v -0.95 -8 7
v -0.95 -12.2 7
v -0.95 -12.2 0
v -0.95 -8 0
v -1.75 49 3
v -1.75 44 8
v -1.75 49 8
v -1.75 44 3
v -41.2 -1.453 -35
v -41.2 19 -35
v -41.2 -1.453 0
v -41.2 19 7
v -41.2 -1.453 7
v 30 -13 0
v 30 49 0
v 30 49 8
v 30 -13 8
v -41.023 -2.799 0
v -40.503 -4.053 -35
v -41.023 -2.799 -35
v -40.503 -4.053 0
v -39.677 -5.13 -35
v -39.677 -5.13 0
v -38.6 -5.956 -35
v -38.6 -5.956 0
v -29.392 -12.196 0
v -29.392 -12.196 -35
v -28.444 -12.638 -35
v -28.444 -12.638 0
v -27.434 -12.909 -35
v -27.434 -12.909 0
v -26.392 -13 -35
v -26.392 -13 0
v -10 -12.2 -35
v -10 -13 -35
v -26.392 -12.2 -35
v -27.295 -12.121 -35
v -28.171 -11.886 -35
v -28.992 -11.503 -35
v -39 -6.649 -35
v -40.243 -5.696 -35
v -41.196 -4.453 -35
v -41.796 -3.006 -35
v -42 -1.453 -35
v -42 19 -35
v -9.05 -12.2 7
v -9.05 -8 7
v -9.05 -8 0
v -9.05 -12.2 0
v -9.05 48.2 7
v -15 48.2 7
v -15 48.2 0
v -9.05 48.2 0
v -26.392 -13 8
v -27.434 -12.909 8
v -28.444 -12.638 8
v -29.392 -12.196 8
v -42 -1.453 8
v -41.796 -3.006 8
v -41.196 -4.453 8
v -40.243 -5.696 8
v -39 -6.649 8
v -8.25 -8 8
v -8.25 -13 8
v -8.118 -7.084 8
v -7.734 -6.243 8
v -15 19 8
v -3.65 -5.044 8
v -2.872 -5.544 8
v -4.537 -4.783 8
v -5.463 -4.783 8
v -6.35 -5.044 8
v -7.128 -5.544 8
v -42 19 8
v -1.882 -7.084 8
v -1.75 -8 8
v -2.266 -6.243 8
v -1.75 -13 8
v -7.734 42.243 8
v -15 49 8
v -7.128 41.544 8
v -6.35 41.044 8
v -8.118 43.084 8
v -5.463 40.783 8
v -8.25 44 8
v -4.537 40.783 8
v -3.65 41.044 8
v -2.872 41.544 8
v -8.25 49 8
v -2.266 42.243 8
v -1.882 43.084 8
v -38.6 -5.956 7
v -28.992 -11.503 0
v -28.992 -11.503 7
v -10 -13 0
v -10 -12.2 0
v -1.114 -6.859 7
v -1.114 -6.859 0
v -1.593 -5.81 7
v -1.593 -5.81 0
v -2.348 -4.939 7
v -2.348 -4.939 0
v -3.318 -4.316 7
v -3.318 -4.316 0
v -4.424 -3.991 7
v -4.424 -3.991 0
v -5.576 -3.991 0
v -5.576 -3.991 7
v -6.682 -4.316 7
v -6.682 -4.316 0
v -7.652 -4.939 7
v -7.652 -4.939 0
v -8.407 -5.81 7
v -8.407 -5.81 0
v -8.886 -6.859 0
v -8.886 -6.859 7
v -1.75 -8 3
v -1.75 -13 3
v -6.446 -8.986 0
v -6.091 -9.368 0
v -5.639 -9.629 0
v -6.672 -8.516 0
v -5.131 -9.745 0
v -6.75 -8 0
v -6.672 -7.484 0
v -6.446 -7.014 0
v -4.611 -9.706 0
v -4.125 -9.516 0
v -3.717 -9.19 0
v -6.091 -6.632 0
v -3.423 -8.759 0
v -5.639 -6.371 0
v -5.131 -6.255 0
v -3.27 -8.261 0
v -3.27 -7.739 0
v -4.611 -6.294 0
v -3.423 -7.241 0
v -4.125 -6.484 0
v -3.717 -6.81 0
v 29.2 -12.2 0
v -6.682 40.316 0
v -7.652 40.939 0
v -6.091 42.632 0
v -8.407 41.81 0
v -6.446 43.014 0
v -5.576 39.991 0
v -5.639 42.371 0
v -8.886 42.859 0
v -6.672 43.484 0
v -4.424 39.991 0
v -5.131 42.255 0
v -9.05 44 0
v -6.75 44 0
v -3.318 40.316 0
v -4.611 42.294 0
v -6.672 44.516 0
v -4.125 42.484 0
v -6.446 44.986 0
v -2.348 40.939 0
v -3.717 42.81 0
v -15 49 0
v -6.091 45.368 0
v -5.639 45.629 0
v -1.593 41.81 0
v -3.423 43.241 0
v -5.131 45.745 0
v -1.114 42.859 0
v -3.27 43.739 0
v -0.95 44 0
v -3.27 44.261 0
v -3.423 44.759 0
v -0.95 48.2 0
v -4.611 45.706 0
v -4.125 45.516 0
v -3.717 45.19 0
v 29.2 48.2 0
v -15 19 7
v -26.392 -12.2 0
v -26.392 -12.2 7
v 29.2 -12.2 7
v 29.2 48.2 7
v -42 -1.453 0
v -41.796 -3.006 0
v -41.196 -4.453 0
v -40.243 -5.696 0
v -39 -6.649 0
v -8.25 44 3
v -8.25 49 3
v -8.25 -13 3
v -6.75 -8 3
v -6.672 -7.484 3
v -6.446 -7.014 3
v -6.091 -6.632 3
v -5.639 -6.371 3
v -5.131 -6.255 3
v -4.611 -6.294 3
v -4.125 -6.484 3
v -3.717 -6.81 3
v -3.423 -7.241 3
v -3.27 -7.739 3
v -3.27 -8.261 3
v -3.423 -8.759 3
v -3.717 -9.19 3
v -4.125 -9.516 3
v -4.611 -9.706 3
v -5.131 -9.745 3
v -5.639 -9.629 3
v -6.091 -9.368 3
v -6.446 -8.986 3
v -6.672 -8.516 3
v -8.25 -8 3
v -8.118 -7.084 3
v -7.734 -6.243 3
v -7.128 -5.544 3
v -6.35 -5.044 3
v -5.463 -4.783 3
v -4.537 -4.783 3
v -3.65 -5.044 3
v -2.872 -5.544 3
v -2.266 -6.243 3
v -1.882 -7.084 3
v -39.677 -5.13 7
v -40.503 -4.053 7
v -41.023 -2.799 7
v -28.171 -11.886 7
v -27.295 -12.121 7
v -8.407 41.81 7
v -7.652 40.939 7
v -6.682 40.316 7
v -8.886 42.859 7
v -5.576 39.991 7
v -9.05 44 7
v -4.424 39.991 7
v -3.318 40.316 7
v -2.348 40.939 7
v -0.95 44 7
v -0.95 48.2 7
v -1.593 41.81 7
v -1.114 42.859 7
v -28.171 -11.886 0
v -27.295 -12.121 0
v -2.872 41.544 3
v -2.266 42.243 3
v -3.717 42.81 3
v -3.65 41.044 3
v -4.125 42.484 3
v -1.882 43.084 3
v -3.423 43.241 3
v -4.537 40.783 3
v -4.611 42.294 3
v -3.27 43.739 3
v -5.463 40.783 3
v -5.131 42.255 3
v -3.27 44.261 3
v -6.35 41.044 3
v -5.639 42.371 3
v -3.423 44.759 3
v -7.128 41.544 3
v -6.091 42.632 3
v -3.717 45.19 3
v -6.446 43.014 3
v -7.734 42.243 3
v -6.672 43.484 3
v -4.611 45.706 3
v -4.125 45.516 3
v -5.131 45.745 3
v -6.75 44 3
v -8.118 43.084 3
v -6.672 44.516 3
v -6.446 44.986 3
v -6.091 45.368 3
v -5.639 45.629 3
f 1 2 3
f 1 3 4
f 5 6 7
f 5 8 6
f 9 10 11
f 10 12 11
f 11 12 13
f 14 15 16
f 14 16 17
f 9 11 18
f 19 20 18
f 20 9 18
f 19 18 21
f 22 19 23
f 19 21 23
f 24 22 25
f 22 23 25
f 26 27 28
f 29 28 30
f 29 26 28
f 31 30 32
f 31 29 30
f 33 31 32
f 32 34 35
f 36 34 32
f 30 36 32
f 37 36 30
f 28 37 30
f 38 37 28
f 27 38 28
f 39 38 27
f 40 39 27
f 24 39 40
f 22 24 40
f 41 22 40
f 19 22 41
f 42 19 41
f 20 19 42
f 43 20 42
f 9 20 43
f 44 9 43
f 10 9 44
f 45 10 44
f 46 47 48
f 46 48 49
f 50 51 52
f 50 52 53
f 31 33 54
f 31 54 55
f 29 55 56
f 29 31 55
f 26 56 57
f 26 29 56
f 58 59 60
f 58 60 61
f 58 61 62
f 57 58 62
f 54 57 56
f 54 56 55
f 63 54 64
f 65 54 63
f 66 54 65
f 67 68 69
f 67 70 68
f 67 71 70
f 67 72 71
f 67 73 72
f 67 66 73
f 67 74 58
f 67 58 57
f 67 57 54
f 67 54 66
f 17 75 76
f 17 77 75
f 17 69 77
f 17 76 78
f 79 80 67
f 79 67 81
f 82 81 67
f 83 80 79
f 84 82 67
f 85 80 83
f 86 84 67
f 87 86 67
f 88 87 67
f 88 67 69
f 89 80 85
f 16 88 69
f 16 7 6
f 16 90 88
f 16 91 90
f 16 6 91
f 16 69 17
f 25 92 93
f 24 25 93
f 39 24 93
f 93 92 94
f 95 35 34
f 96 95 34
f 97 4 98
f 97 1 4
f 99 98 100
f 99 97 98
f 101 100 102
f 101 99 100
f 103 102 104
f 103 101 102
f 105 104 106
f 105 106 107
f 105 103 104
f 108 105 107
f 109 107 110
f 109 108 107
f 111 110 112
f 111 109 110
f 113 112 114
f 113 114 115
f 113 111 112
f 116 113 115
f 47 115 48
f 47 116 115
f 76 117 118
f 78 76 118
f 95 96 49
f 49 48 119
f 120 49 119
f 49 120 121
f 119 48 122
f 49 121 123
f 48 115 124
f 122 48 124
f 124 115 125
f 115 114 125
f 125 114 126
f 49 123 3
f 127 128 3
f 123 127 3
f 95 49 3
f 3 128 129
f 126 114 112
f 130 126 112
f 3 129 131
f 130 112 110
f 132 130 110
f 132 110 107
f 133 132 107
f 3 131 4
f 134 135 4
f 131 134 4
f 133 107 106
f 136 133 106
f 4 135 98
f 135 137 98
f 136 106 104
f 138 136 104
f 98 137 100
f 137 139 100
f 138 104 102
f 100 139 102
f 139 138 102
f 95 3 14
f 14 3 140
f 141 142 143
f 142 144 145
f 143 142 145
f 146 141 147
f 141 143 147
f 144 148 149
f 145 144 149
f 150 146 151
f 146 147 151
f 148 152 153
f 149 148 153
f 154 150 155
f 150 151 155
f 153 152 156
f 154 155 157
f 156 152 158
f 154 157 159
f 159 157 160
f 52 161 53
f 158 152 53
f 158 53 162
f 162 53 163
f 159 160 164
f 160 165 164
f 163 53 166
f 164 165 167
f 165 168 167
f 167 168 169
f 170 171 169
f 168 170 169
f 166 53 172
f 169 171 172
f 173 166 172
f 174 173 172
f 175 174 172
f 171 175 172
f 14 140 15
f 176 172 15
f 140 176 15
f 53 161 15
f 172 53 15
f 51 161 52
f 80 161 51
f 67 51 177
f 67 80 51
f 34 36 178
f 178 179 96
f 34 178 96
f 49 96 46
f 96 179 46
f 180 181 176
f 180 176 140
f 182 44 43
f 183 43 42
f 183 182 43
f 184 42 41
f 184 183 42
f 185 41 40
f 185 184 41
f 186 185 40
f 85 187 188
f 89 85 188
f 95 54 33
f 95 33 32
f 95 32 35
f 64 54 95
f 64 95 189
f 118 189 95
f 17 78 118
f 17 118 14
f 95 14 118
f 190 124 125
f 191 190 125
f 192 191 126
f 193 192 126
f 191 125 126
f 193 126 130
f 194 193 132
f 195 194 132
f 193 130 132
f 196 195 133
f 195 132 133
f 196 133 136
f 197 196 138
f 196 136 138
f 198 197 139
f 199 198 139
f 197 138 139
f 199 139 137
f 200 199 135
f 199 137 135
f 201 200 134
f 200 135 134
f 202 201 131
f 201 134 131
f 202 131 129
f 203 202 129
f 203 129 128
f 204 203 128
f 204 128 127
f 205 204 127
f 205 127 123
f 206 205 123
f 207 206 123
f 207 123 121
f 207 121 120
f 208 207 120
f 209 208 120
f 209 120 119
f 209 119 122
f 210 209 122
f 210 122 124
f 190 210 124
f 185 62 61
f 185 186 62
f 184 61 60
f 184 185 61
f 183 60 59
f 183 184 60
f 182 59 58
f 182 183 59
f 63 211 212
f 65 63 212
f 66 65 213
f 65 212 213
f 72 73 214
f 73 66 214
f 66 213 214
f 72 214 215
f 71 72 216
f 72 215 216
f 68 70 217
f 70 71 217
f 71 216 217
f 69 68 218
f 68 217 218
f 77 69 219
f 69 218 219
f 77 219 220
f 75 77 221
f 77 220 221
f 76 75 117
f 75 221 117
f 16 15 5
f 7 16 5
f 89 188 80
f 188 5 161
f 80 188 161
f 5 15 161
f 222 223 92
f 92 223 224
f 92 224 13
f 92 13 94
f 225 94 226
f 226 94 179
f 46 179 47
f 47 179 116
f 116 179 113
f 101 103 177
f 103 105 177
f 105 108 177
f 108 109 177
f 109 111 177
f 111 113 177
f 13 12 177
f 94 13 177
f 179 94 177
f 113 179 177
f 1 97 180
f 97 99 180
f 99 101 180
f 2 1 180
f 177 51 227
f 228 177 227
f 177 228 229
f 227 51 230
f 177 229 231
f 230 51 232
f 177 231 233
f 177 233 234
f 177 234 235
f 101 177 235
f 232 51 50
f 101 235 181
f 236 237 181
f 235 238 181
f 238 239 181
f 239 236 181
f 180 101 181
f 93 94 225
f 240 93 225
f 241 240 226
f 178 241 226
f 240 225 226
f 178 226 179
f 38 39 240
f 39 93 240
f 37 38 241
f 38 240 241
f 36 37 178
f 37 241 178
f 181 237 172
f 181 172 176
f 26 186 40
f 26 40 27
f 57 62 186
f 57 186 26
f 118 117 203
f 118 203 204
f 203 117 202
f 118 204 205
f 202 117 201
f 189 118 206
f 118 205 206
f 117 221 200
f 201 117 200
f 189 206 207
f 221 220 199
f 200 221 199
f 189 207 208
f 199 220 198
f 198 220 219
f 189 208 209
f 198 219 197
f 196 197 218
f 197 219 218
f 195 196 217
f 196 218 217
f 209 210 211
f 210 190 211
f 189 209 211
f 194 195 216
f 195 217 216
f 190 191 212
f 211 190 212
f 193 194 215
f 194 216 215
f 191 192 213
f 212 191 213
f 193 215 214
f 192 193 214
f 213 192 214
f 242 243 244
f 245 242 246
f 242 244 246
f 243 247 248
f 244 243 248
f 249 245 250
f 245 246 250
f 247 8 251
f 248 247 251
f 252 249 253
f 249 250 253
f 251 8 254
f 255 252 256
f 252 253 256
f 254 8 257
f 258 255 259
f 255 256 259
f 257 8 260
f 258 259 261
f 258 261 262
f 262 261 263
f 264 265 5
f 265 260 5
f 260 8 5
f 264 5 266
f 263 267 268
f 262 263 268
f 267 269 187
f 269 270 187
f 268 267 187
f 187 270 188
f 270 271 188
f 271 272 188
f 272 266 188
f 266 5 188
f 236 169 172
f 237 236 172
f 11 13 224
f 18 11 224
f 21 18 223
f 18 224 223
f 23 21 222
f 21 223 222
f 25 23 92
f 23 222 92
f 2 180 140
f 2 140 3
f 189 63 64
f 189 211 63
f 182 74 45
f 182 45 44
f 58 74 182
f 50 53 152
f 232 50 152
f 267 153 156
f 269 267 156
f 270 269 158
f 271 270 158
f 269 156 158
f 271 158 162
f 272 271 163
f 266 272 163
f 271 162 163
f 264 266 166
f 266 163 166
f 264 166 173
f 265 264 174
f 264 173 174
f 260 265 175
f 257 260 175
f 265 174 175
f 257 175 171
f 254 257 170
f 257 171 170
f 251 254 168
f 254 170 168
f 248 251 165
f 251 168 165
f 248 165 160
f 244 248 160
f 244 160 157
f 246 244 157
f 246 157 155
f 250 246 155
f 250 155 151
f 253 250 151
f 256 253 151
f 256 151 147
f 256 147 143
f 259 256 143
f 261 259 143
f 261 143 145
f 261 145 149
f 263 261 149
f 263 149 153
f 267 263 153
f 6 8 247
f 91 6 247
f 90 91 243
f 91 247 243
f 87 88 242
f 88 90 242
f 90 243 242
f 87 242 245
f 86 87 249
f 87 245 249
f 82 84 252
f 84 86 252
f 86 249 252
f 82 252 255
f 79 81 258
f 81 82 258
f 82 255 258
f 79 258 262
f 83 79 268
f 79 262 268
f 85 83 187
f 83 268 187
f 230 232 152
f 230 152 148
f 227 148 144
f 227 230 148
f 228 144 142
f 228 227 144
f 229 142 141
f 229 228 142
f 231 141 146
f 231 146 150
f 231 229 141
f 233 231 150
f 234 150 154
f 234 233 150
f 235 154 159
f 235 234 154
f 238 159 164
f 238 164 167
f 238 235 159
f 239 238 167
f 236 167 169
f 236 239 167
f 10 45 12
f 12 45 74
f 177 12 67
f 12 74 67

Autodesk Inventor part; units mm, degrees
ref_plane "YZ Plane" through (0, 0, 0) normal (1, 0, 0) x (0, 1, 0)
ref_plane "XZ Plane" through (0, 0, 0) normal (0, 1, 0) x (-1, 0, 0)
ref_plane "XY Plane" through (0, 0, 0) normal (0, 0, 1) x (1, 0, 0)
sketch "Sketch1" plane through (0, 0, 0) normal (0, 0, 1) x (1, 0, 0)
  circle A0 centre (-5, 44) radius 1.4 projected
  circle A1 centre (-5, -8) radius 1.4 projected
  circle A2 centre (-5, 44) radius 1.75
  circle A3 centre (-5, -8) radius 1.75
  circle A4 centre (-5, -8) radius 3.25
  line L0 (-10, 49) -> (30, 49) projected
  line L1 (-10, -13) -> (30, -13) projected
  circle A5 centre (-5, 44) radius 3.25
  line L2 (-1.75, 44) -> (-1.75, 49)
  line L3 (-1.75, -8) -> (-1.75, -13)
  line L4 (-8.25, 44) -> (-8.25, 49)
  line L5 (-8.25, -8) -> (-8.25, -13)
  line L6 (-39, 42.6491) -> (-29.3923, 48.1962) projected
  arc A6 (-39, 42.6491) -> (-42, 37.453) centre (-36, 37.453) ccw projected
  line L7 (-42, -1.453) -> (-42, 37.453) projected
  arc A7 (-42, -1.453) -> (-39, -6.6491) centre (-36, -1.453) ccw projected
  line L8 (-39, -6.6491) -> (-29.3923, -12.1962) projected
  arc A8 (-29.3923, -12.1962) -> (-26.3923, -13) centre (-26.3923, -7) ccw projected
  line L9 (-26.3923, -13) -> (-21.4462, -13) projected
  arc A9 (-26.3923, 49) -> (-29.3923, 48.1962) centre (-26.3923, 43) ccw projected
  line L10 (-10, 49) -> (-38, 49) projected
  line L11 (-10, -13) -> (-21.4462, -13)
  line L12 (30, 49) -> (30, -13)
  circle A10 centre (-26.3923, -7) radius 6
  circle A11 centre (-36, -1.453) radius 6
  circle A12 centre (-36, 37.453) radius 6
  circle A13 centre (-26.3923, 43) radius 6
  line L13 (-29.3923, 48.1962) -> (-39, 42.6491)
  line L14 (-42, 37.453) -> (-42, -1.453)
  line L15 (-39, -6.6491) -> (-29.3923, -12.1962)
  line L16 (-26.3923, -13) -> (-8.25, -13)
  line L17 (-1.75, -13) -> (30, -13)
  line L18 (30, 49) -> (-1.75, 49)
  line L19 (-8.25, 49) -> (-26.3923, 49)
  point P0 (0, 0)
  dimension "d0" = 3.5
  dimension "d1" = 6.5
extrude "Extrusion1" add sketch "Sketch1" along normal blind 7 contours A4 L5 L1 L11 L9 A10 A11 L7 A12 A13 L10 L0 L4 A5 L2 L12 L3 | A8 A10 A11 | L8 A11 A10 | A7 A11 A10 | A10 A11 | A13 A12 A9 | A13 A12 L6 | A6 A12 A13 | A12 A13
sketch "Sketch2" plane through (0, 0, 7) normal (0, 0, 1) x (1, 0, 0)
  line L0 (30, 49) -> (-1.75, 49) projected
  line L1 (-1.75, 49) -> (-1.75, 44) projected
  arc A0 (-8.25, 44) -> (-1.75, 44) centre (-5, 44) ccw projected
  line L2 (-8.25, 44) -> (-8.25, 49) projected
  line L3 (-8.25, 49) -> (-26.3923, 49) projected
  arc A1 (-26.3923, 49) -> (-29.3923, 48.1962) centre (-26.3923, 43) ccw projected
  line L4 (-29.3923, 48.1962) -> (-39, 42.6491) projected
  arc A2 (-39, 42.6491) -> (-42, 37.453) centre (-36, 37.453) ccw projected
  line L5 (-42, 37.453) -> (-42, -1.453) projected
  arc A3 (-42, -1.453) -> (-39, -6.6491) centre (-36, -1.453) ccw projected
  line L6 (-39, -6.6491) -> (-29.3923, -12.1962) projected
  arc A4 (-29.3923, -12.1962) -> (-26.3923, -13) centre (-26.3923, -7) ccw projected
  line L7 (-26.3923, -13) -> (-8.25, -13) projected
  line L8 (-8.25, -13) -> (-8.25, -8) projected
  arc A5 (-1.75, -8) -> (-8.25, -8) centre (-5, -8) ccw projected
  line L9 (-1.75, -8) -> (-1.75, -13) projected
  line L10 (-1.75, -13) -> (30, -13) projected
  line L11 (30, -13) -> (30, 49) projected
  line L12 (-0.95, 48.2) -> (29.2, 48.2)
  line L13 (29.2, 48.2) -> (29.2, -12.2)
  line L14 (29.2, -12.2) -> (-0.95, -12.2)
  line L15 (-0.95, -12.2) -> (-0.95, -8)
  arc A6 (-0.95, -8) -> (-9.05, -8) centre (-5, -8) ccw
  line L16 (-9.05, -8) -> (-9.05, -12.2)
  line L17 (-9.05, -12.2) -> (-26.3923, -12.2)
  arc A7 (-28.9923, -11.5033) -> (-26.3923, -12.2) centre (-26.3923, -7) ccw
  line L18 (-28.9923, -11.5033) -> (-38.6, -5.9563)
  arc A8 (-41.2, -1.453) -> (-38.6, -5.9563) centre (-36, -1.453) ccw
  line L19 (-41.2, -1.453) -> (-41.2, 37.453)
  arc A9 (-38.6, 41.9563) -> (-41.2, 37.453) centre (-36, 37.453) ccw
  line L20 (-38.6, 41.9563) -> (-28.9923, 47.5033)
  arc A10 (-26.3923, 48.2) -> (-28.9923, 47.5033) centre (-26.3923, 43) ccw
  line L21 (-26.3923, 48.2) -> (-9.05, 48.2)
  line L22 (-9.05, 48.2) -> (-9.05, 44)
  arc A11 (-9.05, 44) -> (-0.95, 44) centre (-5, 44) ccw
  line L23 (-0.95, 44) -> (-0.95, 48.2)
  point P0 (0, 0)
  dimension "d4" = 0.8
extrude "Extrusion2" cut sketch "Sketch2" against normal through all contours L12 L13 L14 L15 A6 L16 L17 A7 L18 A8 L19 A9 L20 A10 L21 L22 A11 L23
sketch "Sketch3" plane through (0, 0, 7) normal (0, 0, 1) x (1, 0, 0)
  arc A0 (-38.6, 41.9563) -> (-41.2, 37.453) centre (-36, 37.453) ccw projected
  line L0 (-38.6, 41.9563) -> (-28.9923, 47.5033) projected
  arc A1 (-26.3923, 48.2) -> (-28.9923, 47.5033) centre (-26.3923, 43) ccw projected
  line L1 (-26.3923, 48.2) -> (-9.05, 48.2) projected
  line L2 (-9.05, 48.2) -> (-9.05, 44) projected
  arc A2 (-9.05, 44) -> (-0.95, 44) centre (-5, 44) ccw projected
  line L3 (-0.95, 44) -> (-0.95, 48.2) projected
  line L4 (-0.95, 48.2) -> (29.2, 48.2) projected
  line L5 (29.2, 48.2) -> (29.2, -12.2) projected
  line L6 (29.2, -12.2) -> (-0.95, -12.2) projected
  line L7 (-0.95, -12.2) -> (-0.95, -8) projected
  arc A3 (-0.95, -8) -> (-9.05, -8) centre (-5, -8) ccw projected
  line L8 (-9.05, -8) -> (-9.05, -12.2) projected
  line L9 (-9.05, -12.2) -> (-26.3923, -12.2) projected
  arc A4 (-28.9923, -11.5033) -> (-26.3923, -12.2) centre (-26.3923, -7) ccw projected
  line L10 (-28.9923, -11.5033) -> (-38.6, -5.9563) projected
  arc A5 (-41.2, -1.453) -> (-38.6, -5.9563) centre (-36, -1.453) ccw projected
  line L11 (-41.2, -1.453) -> (-41.2, 37.453) projected
  line L12 (30, 49) -> (-1.75, 49) projected
  line L13 (-1.75, 49) -> (-1.75, 44) projected
  arc A6 (-8.25, 44) -> (-1.75, 44) centre (-5, 44) ccw projected
  line L14 (-8.25, 44) -> (-8.25, 49) projected
  line L15 (-8.25, 49) -> (-26.3923, 49) projected
  arc A7 (-26.3923, 49) -> (-29.3923, 48.1962) centre (-26.3923, 43) ccw projected
  line L16 (-29.3923, 48.1962) -> (-39, 42.6491) projected
  arc A8 (-39, 42.6491) -> (-42, 37.453) centre (-36, 37.453) ccw projected
  line L17 (-42, 37.453) -> (-42, -1.453) projected
  arc A9 (-42, -1.453) -> (-39, -6.6491) centre (-36, -1.453) ccw projected
  line L18 (-39, -6.6491) -> (-29.3923, -12.1962) projected
  arc A10 (-29.3923, -12.1962) -> (-26.3923, -13) centre (-26.3923, -7) ccw projected
  line L19 (-26.3923, -13) -> (-8.25, -13) projected
  line L20 (-8.25, -13) -> (-8.25, -8) projected
  arc A11 (-1.75, -8) -> (-8.25, -8) centre (-5, -8) ccw projected
  line L21 (-1.75, -8) -> (-1.75, -13) projected
  line L22 (-1.75, -13) -> (30, -13) projected
  line L23 (30, -13) -> (30, 49) projected
  point P0 (0, 0)
extrude "Extrusion3" add sketch "Sketch3" along normal blind 1 contours L0 A1 L1 L2 A2 L3 L4 L5 L6 L7 A3 L8 L9 A4 L10 A5 L11 A0 | L23 L22 L21 A11 L20 L19 A10 L18 A9 L17 A8 L16 A7 L15 L14 A6 L13 L12
sketch "Sketch4" plane through (0, 0, 8) normal (0, 0, 1) x (1, 0, 0)
  line L0 (-1.75, -13) -> (30, -13) projected
  line L1 (30, -13) -> (30, 49) projected
  line L2 (30, 49) -> (-1.75, 49) projected
  line L3 (-1.75, 49) -> (-1.75, 44) projected
  arc A0 (-8.25, 44) -> (-1.75, 44) centre (-5, 44) ccw projected
  line L4 (-8.25, 44) -> (-8.25, 49) projected
  line L5 (-8.25, 49) -> (-26.3923, 49) projected
  arc A1 (-26.3923, 49) -> (-29.3923, 48.1962) centre (-26.3923, 43) ccw projected
  line L6 (-29.3923, 48.1962) -> (-39, 42.6491) projected
  arc A2 (-39, 42.6491) -> (-42, 37.453) centre (-36, 37.453) ccw projected
  line L7 (-42, 37.453) -> (-42, -1.453) projected
  arc A3 (-42, -1.453) -> (-39, -6.6491) centre (-36, -1.453) ccw projected
  line L8 (-39, -6.6491) -> (-29.3923, -12.1962) projected
  arc A4 (-29.3923, -12.1962) -> (-26.3923, -13) centre (-26.3923, -7) ccw projected
  line L9 (-26.3923, -13) -> (-8.25, -13) projected
  line L10 (-8.25, -13) -> (-8.25, -8) projected
  arc A5 (-1.75, -8) -> (-8.25, -8) centre (-5, -8) ccw projected
  line L11 (-1.75, -8) -> (-1.75, -13) projected
  line L12 (-8.25, 49) -> (-26.3923, 49) projected
  line L13 (-15, 49) -> (-15, 19)
  line L14 (-15, 19) -> (-42, 19)
  point P0 (0, 0)
  dimension "d9" = 30
  dimension "d10" = 27
extrude "Extrusion4" cut sketch "Sketch4" against normal through all contours L13 L14 L7 A2 L6 A1 L5
sketch "Sketch5" plane through (0, 0, 0) normal (0, 0, -1) x (-1, 0, 0)
  line L0 (15, 48.2) -> (15, 49) projected
  line L1 (8.25, 49) -> (15, 49) projected
  line L2 (8.25, 44) -> (8.25, 49) projected
  arc A0 (1.75, 44) -> (8.25, 44) centre (5, 44) ccw projected
  line L3 (1.75, 49) -> (1.75, 44) projected
  line L4 (-30, 49) -> (1.75, 49) projected
  line L5 (-30, -13) -> (-30, 49) projected
  line L6 (1.75, -13) -> (-30, -13) projected
  line L7 (1.75, -8) -> (1.75, -13) projected
  arc A1 (8.25, -8) -> (1.75, -8) centre (5, -8) ccw projected
  line L8 (8.25, -13) -> (8.25, -8) projected
  line L9 (26.3923, -13) -> (8.25, -13) projected
  arc A2 (26.3923, -13) -> (29.3923, -12.1962) centre (26.3923, -7) ccw projected
  line L10 (39, -6.6491) -> (29.3923, -12.1962) projected
  arc A3 (39, -6.6491) -> (42, -1.453) centre (36, -1.453) ccw projected
  line L11 (42, 19) -> (42, -1.453) projected
  line L12 (42, 19) -> (41.2, 19) projected
  line L13 (41.2, 19) -> (41.2, -1.453) projected
  arc A4 (38.6, -5.9563) -> (41.2, -1.453) centre (36, -1.453) ccw projected
  line L14 (38.6, -5.9563) -> (28.9923, -11.5033) projected
  arc A5 (26.3923, -12.2) -> (28.9923, -11.5033) centre (26.3923, -7) ccw projected
  line L15 (26.3923, -12.2) -> (9.05, -12.2) projected
  line L16 (9.05, -12.2) -> (9.05, -8) projected
  arc A6 (9.05, -8) -> (0.95, -8) centre (5, -8) ccw projected
  line L17 (0.95, -8) -> (0.95, -12.2) projected
  line L18 (0.95, -12.2) -> (-29.2, -12.2) projected
  line L19 (-29.2, -12.2) -> (-29.2, 48.2) projected
  line L20 (-29.2, 48.2) -> (0.95, 48.2) projected
  line L21 (0.95, 48.2) -> (0.95, 44) projected
  arc A7 (0.95, 44) -> (9.05, 44) centre (5, 44) ccw projected
  line L22 (9.05, 44) -> (9.05, 48.2) projected
  line L23 (9.05, 48.2) -> (15, 48.2) projected
  line L24 (10, -13) -> (10, 49) projected
  point P0 (0, 0)
  point P1 (10, -12.2)
extrude "Extrusion5" add sketch "Sketch5" along normal blind 35 contours L15 A5 L14 A4 L13 L12 L11 A3 L10 A2 L9 L24
sketch "Sketch6" plane through (0, 0, 0) normal (0, 0, -1) x (-1, 0, 0)
  arc A0 (8.25, -8) -> (1.75, -8) centre (5, -8) ccw projected
  arc A1 (1.75, 44) -> (8.25, 44) centre (5, 44) ccw projected
  line L0 (10, -13) -> (-30, -13) projected
  line L1 (1.75, -8) -> (1.75, -13) projected
  line L2 (1.75, -8) -> (1.75, -13)
  line L3 (1.75, -13) -> (8.25, -13)
  line L4 (8.25, -13) -> (8.25, -8)
  line L5 (26.3923, 49) -> (-4, 49) projected
  line L6 (1.75, 49) -> (1.75, 44) projected
  line L7 (1.75, 44) -> (1.75, 49)
  line L8 (8.25, 44) -> (8.25, 49) projected
  line L9 (1.75, 49) -> (8.25, 49)
  line L10 (8.25, 49) -> (8.25, 44)
  circle A2 centre (5, 44) radius 1.75
  circle A3 centre (5, -8) radius 1.75
  point P0 (0, 0)
  dimension "d15" = 3.5
extrude "Extrusion6" add sketch "Sketch6" against normal blind 3
properties part number "Extruder Cover" material "ABS Plastic"
